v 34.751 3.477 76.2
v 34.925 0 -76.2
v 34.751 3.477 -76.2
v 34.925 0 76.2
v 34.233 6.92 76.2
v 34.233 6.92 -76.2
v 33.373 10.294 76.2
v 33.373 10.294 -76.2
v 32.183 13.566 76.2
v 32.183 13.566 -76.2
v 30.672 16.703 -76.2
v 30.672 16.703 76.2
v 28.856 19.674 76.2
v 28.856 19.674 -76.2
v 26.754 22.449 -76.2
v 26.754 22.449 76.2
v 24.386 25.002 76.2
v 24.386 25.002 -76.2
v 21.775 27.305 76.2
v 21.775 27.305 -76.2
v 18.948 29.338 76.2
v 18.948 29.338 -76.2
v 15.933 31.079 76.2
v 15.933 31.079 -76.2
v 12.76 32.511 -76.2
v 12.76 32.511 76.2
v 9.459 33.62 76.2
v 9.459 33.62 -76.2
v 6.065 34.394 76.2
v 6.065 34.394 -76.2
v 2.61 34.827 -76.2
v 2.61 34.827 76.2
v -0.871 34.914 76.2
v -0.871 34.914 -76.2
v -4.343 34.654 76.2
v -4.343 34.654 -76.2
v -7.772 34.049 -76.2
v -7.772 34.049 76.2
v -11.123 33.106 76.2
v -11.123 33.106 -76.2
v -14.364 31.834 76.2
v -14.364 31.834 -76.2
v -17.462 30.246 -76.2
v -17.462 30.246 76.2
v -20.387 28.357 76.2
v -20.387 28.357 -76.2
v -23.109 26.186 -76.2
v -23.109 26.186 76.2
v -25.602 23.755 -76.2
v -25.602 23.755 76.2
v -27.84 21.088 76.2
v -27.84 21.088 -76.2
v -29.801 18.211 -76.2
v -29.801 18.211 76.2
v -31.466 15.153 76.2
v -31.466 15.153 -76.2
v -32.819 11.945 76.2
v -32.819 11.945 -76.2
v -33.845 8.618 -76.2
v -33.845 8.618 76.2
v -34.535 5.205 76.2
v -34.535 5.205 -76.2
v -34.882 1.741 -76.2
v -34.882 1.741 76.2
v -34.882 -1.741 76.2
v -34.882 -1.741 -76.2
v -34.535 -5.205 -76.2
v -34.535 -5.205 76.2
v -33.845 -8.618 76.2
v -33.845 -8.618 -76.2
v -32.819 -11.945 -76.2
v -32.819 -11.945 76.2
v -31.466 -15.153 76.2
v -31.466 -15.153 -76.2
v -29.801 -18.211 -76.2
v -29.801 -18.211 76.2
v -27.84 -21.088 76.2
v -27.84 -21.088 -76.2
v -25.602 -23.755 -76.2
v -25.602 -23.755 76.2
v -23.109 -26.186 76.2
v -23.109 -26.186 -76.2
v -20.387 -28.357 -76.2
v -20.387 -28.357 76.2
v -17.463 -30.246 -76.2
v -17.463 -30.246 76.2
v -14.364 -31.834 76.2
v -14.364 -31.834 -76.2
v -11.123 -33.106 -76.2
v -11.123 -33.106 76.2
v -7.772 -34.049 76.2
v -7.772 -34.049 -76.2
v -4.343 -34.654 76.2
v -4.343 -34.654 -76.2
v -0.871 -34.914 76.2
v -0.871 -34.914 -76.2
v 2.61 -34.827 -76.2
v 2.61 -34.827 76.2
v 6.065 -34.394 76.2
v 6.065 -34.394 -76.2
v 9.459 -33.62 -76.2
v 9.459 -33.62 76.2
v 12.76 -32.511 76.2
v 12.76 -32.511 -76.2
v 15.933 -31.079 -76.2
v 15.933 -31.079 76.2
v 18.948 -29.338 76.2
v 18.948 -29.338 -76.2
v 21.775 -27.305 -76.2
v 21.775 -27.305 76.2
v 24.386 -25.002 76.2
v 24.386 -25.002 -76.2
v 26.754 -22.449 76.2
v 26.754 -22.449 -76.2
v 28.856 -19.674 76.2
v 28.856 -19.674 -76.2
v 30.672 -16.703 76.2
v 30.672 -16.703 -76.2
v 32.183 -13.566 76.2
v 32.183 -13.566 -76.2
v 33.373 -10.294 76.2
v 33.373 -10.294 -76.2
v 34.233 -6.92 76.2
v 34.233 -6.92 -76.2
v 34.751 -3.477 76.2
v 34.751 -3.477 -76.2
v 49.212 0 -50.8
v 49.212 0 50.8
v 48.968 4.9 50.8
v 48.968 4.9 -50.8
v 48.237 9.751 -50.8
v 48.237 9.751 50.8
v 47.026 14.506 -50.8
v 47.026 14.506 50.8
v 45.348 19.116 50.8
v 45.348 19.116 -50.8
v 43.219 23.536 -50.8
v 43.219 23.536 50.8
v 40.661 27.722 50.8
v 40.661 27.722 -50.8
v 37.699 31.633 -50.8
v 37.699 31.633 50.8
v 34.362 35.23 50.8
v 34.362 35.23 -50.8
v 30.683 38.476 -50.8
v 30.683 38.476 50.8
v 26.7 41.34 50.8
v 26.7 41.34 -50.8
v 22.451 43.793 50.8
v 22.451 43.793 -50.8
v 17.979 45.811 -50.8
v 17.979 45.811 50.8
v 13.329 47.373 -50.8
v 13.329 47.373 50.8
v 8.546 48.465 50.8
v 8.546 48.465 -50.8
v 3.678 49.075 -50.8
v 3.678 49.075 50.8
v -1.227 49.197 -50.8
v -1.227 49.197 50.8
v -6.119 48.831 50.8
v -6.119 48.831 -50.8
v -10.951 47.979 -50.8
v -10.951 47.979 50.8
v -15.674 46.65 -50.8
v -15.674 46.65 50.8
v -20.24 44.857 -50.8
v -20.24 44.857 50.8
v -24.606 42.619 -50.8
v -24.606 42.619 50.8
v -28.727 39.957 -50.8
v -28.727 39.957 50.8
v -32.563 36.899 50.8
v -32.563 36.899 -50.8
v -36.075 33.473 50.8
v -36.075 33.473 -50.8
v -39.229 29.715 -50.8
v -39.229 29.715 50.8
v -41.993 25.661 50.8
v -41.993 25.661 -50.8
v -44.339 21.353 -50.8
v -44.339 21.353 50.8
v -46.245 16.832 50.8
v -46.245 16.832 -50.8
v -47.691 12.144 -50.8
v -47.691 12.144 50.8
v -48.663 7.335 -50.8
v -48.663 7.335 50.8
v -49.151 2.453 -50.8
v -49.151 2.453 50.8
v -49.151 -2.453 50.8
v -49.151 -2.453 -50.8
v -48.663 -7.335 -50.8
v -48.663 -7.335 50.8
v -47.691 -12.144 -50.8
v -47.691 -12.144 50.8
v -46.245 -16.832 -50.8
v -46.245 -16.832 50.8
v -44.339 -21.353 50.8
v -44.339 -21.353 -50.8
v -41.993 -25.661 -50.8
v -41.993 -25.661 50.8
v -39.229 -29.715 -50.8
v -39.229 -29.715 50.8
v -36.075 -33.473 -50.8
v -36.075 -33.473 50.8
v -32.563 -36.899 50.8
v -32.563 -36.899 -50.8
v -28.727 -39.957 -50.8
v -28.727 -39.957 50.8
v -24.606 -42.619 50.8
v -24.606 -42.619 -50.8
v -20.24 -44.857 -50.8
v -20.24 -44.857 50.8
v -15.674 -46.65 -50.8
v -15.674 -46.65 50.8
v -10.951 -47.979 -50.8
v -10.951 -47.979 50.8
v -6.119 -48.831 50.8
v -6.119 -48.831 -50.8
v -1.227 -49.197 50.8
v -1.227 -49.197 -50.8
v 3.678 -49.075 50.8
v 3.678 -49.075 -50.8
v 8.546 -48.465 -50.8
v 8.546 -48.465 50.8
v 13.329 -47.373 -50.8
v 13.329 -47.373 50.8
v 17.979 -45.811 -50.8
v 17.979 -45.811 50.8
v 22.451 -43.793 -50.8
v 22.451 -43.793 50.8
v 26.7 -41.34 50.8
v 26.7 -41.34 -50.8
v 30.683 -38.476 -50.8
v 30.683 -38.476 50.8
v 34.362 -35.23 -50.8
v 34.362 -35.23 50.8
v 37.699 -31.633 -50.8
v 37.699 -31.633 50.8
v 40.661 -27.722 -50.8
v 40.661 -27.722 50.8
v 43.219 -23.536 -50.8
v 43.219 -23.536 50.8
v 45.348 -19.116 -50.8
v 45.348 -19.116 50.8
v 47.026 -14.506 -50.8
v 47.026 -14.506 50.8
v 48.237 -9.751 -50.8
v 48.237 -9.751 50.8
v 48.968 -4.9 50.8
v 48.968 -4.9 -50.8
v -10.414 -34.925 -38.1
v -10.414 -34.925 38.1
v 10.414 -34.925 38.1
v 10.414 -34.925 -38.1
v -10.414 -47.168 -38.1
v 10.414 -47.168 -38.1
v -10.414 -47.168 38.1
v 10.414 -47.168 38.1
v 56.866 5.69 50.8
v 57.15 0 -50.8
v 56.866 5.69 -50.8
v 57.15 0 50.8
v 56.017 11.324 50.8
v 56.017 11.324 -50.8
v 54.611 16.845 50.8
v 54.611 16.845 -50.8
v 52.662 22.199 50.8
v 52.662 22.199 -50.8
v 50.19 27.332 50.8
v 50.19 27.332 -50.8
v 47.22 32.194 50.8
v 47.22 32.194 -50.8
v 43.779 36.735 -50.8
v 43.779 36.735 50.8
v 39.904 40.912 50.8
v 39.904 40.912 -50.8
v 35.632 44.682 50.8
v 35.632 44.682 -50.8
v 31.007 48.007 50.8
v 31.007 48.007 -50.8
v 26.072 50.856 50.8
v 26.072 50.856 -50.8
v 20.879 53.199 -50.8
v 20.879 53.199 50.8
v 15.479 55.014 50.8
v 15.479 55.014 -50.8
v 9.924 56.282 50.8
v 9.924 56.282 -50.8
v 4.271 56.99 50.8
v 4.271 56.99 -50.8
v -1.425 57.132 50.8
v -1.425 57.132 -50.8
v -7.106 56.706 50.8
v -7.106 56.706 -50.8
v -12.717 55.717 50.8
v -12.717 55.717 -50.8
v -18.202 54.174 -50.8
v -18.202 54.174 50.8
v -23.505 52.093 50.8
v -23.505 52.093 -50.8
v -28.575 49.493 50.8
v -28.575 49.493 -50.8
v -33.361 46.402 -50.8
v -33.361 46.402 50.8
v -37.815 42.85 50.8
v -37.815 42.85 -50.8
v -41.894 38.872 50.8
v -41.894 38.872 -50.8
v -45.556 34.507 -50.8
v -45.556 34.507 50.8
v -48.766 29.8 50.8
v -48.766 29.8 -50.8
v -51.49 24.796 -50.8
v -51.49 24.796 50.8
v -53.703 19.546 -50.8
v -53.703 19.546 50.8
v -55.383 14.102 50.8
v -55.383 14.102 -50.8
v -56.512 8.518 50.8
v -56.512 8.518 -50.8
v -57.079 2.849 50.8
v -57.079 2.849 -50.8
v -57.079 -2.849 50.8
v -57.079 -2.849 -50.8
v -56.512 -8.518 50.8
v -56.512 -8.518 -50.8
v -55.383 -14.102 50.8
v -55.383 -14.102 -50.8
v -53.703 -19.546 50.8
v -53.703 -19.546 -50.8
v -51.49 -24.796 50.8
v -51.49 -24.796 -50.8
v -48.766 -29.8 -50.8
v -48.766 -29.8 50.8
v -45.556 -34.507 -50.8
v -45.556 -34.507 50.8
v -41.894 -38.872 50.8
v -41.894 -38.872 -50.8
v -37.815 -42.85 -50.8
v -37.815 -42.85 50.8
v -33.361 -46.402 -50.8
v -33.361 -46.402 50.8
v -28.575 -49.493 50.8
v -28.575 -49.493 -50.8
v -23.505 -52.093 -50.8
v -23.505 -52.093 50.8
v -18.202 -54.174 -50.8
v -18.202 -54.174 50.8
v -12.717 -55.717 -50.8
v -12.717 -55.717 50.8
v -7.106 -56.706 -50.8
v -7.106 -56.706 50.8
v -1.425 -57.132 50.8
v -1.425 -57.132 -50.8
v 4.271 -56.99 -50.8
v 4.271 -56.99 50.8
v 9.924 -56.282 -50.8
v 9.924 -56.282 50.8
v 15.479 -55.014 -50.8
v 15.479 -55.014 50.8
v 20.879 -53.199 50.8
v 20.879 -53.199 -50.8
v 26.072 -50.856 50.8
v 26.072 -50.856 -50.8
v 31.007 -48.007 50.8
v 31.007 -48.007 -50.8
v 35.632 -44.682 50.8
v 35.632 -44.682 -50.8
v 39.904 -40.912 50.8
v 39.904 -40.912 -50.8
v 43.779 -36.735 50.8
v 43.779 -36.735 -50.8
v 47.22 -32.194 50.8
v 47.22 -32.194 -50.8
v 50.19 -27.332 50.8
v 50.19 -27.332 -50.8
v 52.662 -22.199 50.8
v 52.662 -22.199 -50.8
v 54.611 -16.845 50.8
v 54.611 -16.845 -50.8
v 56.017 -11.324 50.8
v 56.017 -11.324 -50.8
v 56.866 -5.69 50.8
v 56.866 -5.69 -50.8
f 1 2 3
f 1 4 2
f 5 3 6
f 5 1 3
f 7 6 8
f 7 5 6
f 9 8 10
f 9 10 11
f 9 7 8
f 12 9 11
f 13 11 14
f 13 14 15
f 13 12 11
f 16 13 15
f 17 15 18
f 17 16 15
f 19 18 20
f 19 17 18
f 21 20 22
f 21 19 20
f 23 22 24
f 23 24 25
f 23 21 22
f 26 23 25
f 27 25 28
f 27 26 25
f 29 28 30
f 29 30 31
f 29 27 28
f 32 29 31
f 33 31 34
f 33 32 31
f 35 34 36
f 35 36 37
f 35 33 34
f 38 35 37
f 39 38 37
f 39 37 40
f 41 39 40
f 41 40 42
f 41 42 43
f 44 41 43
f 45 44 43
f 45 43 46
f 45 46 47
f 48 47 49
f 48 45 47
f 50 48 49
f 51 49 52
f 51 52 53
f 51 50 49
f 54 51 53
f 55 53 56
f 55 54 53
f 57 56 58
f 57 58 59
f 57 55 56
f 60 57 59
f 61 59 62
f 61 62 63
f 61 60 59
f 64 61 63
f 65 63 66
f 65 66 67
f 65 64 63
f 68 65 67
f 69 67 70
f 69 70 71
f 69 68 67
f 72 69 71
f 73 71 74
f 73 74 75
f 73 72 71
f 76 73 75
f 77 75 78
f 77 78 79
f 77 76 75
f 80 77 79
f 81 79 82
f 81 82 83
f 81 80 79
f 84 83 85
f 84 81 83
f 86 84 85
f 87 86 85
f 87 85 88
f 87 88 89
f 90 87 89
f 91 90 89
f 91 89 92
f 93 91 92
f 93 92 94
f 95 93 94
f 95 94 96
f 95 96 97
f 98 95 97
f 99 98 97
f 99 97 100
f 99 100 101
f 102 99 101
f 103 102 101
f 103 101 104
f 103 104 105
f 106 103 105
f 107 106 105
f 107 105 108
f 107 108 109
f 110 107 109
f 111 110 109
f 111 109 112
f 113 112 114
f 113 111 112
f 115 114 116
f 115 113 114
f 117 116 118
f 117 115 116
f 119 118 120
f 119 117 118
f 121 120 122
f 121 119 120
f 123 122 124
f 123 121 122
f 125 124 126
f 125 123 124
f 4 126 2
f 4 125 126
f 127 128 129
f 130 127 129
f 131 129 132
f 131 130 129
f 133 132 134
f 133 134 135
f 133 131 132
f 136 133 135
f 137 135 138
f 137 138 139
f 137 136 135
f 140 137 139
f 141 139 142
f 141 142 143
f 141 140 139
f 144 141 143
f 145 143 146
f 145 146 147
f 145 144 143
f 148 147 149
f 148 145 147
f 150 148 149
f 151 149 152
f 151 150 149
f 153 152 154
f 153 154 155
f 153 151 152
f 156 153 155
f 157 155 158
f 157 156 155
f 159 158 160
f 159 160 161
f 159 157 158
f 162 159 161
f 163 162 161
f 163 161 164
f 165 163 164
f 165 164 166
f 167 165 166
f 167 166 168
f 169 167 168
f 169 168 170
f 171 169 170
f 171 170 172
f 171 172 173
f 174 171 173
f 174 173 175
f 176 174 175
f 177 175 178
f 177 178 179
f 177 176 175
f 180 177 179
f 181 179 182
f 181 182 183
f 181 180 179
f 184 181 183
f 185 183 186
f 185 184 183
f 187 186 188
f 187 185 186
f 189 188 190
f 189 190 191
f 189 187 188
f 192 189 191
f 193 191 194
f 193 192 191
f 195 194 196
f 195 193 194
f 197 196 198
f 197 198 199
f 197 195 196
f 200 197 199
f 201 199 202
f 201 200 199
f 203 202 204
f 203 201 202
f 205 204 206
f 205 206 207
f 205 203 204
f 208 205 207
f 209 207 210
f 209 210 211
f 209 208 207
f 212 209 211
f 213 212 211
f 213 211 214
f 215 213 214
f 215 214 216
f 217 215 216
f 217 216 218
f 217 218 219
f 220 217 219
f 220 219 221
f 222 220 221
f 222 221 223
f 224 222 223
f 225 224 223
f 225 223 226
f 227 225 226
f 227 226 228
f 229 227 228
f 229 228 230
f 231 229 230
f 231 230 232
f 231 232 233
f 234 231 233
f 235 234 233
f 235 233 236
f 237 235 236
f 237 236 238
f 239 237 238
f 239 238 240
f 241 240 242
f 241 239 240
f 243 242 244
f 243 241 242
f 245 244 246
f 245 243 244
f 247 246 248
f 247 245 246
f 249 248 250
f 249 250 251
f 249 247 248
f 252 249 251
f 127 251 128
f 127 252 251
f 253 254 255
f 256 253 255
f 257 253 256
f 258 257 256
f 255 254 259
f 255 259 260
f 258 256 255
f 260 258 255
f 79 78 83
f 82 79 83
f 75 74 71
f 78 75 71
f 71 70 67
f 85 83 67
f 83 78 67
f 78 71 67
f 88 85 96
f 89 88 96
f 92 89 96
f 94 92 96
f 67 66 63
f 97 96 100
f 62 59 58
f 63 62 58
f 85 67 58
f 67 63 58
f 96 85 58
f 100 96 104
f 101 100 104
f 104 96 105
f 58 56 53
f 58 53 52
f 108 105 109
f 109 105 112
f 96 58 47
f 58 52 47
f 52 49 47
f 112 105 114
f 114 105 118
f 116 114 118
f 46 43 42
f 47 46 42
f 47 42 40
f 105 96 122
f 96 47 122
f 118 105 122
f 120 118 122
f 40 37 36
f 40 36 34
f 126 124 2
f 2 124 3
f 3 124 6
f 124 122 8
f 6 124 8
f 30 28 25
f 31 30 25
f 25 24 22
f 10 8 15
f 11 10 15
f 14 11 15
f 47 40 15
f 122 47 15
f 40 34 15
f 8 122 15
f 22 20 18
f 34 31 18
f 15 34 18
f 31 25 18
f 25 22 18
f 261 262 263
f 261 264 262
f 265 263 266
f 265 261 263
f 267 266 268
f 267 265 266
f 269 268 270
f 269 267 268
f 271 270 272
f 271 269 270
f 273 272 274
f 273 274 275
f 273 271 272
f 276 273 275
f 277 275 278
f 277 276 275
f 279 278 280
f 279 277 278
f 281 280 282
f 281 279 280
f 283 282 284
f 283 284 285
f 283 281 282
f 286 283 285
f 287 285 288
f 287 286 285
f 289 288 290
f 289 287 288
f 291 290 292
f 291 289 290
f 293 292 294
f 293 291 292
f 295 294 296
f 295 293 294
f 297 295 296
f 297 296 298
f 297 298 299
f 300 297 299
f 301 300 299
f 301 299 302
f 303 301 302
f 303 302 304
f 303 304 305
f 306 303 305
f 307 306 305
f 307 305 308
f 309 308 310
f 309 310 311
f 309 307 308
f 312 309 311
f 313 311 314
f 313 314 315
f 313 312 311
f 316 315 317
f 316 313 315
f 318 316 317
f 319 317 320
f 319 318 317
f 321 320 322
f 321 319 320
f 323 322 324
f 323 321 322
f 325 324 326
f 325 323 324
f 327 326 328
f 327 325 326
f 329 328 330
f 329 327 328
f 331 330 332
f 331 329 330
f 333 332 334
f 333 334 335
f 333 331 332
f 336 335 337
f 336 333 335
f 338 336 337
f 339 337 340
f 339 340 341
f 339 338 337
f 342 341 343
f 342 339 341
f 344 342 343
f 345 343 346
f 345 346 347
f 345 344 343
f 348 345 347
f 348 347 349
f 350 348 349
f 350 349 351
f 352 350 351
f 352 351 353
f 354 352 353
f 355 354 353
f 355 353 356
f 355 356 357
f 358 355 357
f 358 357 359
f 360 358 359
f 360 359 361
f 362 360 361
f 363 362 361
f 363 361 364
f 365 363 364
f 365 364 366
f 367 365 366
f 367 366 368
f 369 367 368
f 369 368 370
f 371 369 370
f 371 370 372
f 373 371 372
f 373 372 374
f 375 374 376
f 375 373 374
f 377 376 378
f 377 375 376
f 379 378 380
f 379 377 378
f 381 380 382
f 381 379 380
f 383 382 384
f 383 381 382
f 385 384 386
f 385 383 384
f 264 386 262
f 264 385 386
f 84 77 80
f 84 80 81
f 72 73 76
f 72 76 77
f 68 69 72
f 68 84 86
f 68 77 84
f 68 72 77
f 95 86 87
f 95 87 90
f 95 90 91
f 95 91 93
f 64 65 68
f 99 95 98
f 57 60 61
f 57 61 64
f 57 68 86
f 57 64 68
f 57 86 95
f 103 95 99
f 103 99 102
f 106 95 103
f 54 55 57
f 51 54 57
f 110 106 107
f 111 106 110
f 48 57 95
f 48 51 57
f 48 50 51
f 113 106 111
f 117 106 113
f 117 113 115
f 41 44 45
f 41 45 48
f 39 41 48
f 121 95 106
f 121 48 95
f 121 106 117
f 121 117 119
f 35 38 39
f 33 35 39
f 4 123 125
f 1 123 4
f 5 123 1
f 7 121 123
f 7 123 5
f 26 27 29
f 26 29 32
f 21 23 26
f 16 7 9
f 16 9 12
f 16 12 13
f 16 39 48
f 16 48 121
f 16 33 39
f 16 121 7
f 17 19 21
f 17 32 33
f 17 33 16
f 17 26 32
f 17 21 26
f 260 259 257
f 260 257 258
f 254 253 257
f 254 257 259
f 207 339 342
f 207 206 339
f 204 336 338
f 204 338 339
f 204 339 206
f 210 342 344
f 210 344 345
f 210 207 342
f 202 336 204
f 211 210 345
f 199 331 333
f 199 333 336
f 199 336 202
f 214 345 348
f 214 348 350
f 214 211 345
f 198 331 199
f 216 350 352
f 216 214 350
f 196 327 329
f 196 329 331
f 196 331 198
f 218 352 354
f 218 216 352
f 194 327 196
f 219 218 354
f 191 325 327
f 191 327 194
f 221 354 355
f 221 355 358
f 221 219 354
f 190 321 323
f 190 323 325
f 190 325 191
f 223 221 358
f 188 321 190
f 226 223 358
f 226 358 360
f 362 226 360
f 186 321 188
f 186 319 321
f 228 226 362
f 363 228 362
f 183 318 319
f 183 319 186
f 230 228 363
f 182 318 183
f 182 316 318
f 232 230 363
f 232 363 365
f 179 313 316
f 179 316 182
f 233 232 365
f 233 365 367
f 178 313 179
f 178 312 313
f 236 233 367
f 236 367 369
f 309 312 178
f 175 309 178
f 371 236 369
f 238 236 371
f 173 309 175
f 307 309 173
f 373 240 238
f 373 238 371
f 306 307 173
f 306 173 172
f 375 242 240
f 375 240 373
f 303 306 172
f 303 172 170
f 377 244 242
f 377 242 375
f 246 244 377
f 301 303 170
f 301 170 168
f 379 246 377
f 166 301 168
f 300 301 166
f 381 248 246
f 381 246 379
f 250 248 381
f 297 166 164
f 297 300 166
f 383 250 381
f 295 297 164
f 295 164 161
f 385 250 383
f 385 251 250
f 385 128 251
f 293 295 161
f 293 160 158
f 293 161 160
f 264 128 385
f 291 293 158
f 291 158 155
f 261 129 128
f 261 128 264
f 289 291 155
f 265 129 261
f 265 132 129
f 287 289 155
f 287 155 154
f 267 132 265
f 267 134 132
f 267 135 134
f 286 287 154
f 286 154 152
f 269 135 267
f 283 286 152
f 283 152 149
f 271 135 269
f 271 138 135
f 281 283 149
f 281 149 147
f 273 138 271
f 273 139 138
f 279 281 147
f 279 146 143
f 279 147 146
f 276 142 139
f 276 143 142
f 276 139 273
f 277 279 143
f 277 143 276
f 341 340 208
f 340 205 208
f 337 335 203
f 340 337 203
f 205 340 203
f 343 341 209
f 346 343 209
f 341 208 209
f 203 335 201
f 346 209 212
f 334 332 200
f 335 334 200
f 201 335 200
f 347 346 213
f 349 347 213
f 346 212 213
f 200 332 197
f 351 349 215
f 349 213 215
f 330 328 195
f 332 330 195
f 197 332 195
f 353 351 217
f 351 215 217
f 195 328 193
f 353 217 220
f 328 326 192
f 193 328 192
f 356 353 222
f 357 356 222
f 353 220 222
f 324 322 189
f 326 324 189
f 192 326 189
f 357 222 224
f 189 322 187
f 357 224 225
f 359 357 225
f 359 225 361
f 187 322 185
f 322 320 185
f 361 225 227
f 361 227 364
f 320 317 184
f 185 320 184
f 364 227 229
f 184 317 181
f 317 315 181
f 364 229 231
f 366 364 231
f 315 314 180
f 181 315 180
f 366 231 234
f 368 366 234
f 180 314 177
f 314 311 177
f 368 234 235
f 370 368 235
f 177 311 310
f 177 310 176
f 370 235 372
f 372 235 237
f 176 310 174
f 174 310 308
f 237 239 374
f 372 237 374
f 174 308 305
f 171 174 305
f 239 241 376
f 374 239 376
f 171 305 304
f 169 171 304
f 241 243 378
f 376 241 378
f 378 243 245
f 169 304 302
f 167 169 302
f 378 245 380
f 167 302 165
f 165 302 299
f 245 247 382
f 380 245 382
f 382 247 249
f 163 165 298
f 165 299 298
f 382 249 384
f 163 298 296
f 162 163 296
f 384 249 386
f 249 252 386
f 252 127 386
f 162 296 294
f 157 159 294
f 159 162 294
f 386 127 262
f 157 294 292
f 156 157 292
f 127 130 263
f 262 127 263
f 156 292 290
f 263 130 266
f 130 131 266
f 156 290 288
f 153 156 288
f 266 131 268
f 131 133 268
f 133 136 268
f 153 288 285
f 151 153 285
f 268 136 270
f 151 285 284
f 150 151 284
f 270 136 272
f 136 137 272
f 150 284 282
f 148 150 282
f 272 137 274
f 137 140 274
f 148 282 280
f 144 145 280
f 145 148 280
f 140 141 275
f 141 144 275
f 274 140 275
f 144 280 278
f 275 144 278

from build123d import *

# Parameters (mm, degrees)
F0_R     = 34.925
F1_DEPTH = 76.2
F2_R     = 57.15
F2_R_2   = 49.2125
F3_DEPTH = 50.8
F5_W     = 20.828
F5_H     = 76.2
F6_DEPTH = 12.2428


with BuildPart() as f1:
    # F0 (on Top) → F1 (new body, symmetric)
    with BuildSketch(Plane.XY):
        Circle(F0_R)
    extrude(amount=F1_DEPTH, both=True)


with BuildPart() as f3:
    # F2 (on Top) → F3 (new body, symmetric)
    with BuildSketch(Plane.XY):
        Circle(F2_R)
        Circle(F2_R_2, mode=Mode.SUBTRACT)
    extrude(amount=F3_DEPTH, both=True)


with BuildPart() as f6:
    # F5 (on offset) → F6 (new body)
    with BuildSketch(Plane.XZ.offset(34.925)):
        Rectangle(F5_W, F5_H)
    extrude(amount=F6_DEPTH)


solid = Compound([f1.part, f3.part, f6.part])
